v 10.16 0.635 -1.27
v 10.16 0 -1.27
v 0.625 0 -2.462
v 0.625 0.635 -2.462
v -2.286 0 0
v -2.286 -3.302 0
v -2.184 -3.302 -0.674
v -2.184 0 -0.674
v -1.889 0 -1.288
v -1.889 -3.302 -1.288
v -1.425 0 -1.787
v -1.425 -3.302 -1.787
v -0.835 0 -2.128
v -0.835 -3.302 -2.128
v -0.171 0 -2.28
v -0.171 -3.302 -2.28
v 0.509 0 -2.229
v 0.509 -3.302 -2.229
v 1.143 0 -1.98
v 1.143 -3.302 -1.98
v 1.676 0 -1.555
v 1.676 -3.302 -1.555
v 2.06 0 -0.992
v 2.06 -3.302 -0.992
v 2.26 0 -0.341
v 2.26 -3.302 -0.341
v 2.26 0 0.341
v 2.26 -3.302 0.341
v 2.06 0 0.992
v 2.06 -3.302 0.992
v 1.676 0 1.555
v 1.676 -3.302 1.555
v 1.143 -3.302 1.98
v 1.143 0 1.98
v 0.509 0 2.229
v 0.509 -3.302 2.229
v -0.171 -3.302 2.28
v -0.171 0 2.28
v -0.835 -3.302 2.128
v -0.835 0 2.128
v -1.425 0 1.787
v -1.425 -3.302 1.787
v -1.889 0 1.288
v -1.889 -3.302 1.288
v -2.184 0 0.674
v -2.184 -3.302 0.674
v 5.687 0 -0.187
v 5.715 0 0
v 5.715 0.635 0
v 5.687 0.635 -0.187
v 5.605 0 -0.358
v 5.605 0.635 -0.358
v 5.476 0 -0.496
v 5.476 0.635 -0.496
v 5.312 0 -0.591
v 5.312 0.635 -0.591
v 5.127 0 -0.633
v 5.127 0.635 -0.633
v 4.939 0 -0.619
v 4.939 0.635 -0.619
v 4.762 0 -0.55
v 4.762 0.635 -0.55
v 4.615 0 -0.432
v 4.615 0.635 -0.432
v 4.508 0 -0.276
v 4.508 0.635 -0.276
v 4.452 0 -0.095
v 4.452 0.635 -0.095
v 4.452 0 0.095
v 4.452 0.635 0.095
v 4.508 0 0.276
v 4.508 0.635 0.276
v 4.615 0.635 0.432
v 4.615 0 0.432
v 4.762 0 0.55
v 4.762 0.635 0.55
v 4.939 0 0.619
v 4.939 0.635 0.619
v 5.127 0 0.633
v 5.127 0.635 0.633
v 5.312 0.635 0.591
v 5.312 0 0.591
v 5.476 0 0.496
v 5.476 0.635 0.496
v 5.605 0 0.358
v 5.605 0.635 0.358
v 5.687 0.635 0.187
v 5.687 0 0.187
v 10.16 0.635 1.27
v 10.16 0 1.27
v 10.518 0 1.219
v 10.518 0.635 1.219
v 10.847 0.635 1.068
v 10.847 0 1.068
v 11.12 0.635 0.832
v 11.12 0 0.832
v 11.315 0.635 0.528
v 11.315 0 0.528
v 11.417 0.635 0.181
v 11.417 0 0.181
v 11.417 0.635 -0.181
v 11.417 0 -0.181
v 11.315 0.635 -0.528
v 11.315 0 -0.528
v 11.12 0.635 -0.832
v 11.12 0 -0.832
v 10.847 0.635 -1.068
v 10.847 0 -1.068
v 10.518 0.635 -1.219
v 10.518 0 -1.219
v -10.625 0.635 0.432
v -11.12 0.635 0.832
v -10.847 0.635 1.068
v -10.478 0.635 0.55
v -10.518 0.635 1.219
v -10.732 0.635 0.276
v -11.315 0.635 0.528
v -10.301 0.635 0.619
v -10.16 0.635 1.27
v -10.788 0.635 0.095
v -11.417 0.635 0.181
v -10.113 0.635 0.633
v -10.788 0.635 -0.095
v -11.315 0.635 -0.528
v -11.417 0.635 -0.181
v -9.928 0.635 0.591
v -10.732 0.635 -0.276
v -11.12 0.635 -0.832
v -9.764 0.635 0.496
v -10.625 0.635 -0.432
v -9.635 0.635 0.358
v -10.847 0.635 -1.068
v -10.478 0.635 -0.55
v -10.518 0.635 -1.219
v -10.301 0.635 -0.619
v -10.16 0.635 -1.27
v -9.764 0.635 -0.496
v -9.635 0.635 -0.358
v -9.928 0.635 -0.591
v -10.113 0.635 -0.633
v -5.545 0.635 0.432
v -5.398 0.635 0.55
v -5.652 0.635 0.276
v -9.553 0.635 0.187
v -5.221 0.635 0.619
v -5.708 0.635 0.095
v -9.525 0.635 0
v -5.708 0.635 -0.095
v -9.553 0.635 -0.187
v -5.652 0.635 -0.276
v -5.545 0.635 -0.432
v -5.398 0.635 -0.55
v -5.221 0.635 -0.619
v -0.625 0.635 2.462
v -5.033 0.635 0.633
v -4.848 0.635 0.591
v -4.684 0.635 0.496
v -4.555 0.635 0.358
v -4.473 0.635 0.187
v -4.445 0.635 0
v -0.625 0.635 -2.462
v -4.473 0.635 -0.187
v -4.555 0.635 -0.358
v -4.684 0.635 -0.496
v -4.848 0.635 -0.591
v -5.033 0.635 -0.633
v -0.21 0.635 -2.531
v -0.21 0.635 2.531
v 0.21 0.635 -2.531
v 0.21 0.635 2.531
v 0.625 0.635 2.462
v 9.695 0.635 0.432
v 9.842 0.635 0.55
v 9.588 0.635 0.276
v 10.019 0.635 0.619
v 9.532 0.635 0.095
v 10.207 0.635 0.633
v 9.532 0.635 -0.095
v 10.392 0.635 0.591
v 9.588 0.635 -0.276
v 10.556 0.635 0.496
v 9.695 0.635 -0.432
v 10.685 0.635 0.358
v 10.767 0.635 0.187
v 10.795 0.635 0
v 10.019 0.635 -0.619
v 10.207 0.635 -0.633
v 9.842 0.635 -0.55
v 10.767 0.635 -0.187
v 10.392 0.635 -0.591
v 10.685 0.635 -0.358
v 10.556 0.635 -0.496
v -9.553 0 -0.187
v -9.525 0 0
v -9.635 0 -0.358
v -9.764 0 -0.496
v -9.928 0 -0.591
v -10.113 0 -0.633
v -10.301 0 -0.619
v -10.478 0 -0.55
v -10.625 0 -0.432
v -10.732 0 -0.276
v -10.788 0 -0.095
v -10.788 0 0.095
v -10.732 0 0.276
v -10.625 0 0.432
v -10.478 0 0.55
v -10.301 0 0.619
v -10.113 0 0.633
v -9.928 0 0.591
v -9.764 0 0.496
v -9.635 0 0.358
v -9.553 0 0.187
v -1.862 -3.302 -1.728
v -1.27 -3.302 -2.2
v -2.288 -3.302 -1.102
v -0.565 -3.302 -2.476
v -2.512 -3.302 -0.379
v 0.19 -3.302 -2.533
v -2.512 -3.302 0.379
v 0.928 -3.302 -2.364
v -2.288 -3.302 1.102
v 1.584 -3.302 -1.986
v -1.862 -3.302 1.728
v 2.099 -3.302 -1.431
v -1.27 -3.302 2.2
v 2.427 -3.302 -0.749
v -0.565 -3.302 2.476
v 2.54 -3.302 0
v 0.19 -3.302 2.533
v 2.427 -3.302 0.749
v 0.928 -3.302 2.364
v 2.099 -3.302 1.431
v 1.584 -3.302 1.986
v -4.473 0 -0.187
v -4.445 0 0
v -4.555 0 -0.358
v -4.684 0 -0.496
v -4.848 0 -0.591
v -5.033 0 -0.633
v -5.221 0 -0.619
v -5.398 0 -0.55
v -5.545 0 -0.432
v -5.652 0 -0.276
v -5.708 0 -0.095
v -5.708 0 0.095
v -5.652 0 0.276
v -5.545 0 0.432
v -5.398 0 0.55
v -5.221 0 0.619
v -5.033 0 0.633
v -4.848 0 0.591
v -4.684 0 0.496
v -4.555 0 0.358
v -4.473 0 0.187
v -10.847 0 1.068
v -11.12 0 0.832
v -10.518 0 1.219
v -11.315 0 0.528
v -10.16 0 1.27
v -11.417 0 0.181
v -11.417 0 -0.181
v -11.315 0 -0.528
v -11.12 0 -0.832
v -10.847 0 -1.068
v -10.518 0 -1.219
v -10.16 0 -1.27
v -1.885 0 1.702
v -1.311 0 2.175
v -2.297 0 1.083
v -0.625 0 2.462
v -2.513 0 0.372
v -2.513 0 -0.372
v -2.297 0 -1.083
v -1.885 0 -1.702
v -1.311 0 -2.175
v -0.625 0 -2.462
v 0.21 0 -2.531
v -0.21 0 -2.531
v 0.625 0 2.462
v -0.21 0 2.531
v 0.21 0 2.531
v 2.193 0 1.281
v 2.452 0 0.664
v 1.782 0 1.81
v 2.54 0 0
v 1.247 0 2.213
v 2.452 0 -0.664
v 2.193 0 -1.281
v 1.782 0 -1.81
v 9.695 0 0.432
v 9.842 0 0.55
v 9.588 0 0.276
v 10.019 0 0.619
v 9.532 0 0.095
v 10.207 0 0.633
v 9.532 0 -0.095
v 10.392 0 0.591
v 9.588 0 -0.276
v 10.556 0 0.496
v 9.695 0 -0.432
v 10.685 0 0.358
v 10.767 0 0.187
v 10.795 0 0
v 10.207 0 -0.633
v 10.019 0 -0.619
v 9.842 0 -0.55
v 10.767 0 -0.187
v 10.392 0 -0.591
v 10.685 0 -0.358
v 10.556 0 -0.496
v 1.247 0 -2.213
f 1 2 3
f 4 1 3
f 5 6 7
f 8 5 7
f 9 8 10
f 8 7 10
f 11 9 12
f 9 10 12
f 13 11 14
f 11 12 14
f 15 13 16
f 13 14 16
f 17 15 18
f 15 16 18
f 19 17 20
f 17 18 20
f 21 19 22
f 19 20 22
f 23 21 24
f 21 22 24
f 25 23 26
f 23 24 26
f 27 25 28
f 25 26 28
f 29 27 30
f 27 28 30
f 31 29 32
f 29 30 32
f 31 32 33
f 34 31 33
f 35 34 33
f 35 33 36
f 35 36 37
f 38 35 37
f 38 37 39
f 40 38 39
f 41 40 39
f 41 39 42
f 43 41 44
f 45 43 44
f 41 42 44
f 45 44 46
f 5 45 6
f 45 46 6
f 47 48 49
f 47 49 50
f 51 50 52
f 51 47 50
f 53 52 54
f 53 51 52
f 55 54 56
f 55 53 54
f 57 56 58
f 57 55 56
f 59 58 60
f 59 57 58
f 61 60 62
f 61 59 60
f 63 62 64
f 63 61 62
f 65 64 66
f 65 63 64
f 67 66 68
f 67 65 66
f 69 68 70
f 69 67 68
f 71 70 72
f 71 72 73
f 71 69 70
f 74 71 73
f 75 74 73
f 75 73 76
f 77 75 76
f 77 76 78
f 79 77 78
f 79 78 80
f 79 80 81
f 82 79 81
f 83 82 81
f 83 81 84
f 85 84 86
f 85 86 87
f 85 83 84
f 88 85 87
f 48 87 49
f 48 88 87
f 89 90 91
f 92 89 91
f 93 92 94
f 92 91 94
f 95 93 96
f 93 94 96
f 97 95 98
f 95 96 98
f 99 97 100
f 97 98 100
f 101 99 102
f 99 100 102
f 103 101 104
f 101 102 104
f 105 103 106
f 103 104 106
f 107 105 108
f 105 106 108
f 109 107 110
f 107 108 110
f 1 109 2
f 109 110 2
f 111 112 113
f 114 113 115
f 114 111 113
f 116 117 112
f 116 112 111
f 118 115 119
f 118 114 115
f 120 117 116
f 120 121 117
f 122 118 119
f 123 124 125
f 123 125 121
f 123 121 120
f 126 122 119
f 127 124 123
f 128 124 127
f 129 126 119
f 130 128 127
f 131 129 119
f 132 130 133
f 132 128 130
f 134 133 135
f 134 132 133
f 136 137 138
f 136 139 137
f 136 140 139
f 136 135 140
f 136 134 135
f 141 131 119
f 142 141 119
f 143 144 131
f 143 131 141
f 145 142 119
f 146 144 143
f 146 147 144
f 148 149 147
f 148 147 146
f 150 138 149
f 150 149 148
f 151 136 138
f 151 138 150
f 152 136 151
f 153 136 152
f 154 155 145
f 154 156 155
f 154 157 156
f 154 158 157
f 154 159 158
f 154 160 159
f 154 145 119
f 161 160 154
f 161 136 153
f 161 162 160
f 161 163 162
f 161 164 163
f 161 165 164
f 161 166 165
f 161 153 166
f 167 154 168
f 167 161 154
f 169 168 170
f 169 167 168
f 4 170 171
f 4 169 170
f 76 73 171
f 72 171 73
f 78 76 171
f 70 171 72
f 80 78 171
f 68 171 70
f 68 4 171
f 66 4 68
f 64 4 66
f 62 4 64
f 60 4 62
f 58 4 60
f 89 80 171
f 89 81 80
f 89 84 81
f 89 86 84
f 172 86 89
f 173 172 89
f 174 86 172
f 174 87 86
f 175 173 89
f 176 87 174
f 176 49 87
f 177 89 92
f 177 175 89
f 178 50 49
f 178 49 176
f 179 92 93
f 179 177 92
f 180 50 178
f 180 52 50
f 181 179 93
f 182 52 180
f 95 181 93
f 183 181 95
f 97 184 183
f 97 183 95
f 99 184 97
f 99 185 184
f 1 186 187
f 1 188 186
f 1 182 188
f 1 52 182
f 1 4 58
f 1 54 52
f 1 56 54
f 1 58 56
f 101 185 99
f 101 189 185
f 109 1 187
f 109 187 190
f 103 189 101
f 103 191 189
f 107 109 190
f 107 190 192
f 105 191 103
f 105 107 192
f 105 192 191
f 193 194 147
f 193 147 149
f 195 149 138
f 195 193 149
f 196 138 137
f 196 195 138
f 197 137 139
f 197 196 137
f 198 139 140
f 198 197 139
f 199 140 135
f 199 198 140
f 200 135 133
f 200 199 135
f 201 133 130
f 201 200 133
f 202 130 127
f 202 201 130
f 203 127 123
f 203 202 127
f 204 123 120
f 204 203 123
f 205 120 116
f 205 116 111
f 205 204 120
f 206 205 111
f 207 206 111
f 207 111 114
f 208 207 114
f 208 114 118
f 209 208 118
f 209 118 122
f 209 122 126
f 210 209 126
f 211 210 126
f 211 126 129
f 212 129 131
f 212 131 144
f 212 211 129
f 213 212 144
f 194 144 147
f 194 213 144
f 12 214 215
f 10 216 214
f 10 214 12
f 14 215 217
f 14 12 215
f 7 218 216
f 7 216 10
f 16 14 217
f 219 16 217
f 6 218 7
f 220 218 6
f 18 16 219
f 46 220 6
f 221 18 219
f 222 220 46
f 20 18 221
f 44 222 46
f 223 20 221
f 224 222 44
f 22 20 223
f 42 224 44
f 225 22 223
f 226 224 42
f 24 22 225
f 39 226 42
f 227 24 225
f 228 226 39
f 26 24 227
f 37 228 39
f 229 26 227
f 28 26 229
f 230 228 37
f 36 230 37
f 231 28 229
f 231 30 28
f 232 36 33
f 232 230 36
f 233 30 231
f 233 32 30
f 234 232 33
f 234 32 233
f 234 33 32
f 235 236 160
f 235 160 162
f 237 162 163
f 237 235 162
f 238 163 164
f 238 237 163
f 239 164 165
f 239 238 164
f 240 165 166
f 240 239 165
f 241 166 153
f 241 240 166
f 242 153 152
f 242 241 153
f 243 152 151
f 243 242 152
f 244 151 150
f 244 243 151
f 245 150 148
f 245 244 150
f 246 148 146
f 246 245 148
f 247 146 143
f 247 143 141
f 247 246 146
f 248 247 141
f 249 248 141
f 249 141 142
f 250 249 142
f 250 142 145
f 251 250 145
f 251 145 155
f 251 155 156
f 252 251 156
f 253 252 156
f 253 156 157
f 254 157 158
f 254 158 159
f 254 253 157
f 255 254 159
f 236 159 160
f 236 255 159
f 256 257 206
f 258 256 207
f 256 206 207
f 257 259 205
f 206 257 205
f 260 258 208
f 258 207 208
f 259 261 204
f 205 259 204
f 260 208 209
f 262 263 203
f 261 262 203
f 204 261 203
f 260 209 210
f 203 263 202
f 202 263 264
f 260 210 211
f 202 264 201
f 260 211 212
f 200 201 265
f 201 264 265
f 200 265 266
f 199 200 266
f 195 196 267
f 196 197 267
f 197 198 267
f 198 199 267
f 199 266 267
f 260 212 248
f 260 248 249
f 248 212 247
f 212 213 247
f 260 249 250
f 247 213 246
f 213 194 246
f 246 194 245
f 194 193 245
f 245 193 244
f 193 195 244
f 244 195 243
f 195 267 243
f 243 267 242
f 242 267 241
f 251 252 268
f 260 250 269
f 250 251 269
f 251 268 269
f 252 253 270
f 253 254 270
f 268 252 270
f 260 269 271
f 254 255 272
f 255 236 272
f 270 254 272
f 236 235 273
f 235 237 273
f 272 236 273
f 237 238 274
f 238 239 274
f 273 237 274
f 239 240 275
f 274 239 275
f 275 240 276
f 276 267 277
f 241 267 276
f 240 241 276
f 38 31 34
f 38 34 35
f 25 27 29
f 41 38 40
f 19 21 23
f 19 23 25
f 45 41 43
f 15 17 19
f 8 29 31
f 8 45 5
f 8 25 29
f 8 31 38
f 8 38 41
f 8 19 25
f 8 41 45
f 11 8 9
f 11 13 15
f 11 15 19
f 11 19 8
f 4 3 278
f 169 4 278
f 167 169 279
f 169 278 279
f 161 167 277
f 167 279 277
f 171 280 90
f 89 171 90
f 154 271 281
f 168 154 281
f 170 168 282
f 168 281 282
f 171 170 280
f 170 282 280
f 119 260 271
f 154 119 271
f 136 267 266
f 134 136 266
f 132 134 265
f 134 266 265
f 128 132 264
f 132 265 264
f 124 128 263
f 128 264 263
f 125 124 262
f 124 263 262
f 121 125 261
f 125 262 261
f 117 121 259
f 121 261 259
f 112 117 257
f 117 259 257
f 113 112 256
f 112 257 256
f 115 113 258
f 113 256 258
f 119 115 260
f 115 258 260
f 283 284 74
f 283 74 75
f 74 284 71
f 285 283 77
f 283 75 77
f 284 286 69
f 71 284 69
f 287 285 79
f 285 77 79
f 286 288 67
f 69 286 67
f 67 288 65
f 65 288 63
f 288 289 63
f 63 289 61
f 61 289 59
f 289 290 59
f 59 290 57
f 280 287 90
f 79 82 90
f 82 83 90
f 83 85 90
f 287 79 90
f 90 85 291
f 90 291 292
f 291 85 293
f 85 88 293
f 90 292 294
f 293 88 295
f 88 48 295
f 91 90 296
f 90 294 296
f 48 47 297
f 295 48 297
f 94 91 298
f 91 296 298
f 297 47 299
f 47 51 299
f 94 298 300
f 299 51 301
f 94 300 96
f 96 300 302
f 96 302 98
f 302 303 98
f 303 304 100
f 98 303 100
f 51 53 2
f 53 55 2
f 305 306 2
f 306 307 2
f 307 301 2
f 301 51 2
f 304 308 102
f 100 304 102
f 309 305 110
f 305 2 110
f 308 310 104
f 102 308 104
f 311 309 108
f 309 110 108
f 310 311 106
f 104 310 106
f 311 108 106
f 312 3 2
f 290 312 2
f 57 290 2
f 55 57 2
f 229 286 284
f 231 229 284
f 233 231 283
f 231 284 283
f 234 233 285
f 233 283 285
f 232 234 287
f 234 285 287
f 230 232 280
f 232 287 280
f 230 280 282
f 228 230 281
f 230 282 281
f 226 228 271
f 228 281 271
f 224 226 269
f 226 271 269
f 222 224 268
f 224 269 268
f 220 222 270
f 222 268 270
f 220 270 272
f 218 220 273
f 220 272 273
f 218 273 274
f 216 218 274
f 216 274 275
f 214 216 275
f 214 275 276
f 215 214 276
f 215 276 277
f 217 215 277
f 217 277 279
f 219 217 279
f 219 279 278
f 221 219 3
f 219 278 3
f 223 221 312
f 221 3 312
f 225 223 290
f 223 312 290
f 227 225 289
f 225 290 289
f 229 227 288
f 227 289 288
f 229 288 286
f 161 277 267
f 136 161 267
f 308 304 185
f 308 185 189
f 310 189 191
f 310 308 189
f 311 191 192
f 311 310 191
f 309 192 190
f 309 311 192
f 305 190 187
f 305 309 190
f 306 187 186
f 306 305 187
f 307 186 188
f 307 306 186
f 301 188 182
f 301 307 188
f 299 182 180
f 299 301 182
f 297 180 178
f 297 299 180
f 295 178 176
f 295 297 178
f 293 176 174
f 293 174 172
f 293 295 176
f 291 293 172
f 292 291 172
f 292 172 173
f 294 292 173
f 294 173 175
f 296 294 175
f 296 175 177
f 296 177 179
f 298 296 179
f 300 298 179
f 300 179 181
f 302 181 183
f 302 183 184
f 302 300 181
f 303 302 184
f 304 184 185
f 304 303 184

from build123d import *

# Parameters (mm, degrees)
SKETCH2_R           = 0.635
BOSS_EXTRUDE2_DEPTH = 0.635
SKETCH3_R           = 2.54
BOSS_EXTRUDE3_DEPTH = 3.302
SKETCH4_R           = 2.286
CUT_EXTRUDE1_DEPTH  = 3.302


with BuildPart() as part:
    # Sketch2 → Boss-Extrude2 (new body)
    with BuildSketch(Plane(origin=(0, 0, 0), x_dir=(1, 0, 0), z_dir=(0, 1, 0))):
        with BuildLine():
            Line((-10.16, -1.27), (-0.625230769, -2.461846154))
            ThreePointArc((-0.625230769, -2.461846154), (0, -2.54), (0.625230769, -2.461846154))
            Line((0.625230769, -2.461846154), (10.16, -1.27))
            ThreePointArc((10.16, -1.27), (11.43, 0), (10.16, 1.27))
            Line((10.16, 1.27), (0.625230769, 2.461846154))
            ThreePointArc((0.625230769, 2.461846154), (0, 2.54), (-0.625230769, 2.461846154))
            Line((-0.625230769, 2.461846154), (-10.16, 1.27))
            ThreePointArc((-10.16, 1.27), (-11.43, 0), (-10.16, -1.27))
        make_face()
        with Locations((5.08, 0)):
            Circle(SKETCH2_R, mode=Mode.SUBTRACT)
        with Locations((10.16, 0)):
            Circle(SKETCH2_R, mode=Mode.SUBTRACT)
        with Locations((-10.16, 0)):
            Circle(SKETCH2_R, mode=Mode.SUBTRACT)
        with Locations((-5.08, 0)):
            Circle(SKETCH2_R, mode=Mode.SUBTRACT)
    extrude(amount=BOSS_EXTRUDE2_DEPTH)

    # Sketch3 → Boss-Extrude3 (add)
    with BuildSketch(Plane.XZ):
        Circle(SKETCH3_R)
    extrude(amount=BOSS_EXTRUDE3_DEPTH)

    # Sketch4 → Cut-Extrude1 (cut)
    with BuildSketch(Plane(origin=(0, -3.302, 0), x_dir=(-1, 0, 0), z_dir=(0, -1, 0))):
        Circle(SKETCH4_R)
    extrude(amount=-CUT_EXTRUDE1_DEPTH, mode=Mode.SUBTRACT)


solid = part.part
